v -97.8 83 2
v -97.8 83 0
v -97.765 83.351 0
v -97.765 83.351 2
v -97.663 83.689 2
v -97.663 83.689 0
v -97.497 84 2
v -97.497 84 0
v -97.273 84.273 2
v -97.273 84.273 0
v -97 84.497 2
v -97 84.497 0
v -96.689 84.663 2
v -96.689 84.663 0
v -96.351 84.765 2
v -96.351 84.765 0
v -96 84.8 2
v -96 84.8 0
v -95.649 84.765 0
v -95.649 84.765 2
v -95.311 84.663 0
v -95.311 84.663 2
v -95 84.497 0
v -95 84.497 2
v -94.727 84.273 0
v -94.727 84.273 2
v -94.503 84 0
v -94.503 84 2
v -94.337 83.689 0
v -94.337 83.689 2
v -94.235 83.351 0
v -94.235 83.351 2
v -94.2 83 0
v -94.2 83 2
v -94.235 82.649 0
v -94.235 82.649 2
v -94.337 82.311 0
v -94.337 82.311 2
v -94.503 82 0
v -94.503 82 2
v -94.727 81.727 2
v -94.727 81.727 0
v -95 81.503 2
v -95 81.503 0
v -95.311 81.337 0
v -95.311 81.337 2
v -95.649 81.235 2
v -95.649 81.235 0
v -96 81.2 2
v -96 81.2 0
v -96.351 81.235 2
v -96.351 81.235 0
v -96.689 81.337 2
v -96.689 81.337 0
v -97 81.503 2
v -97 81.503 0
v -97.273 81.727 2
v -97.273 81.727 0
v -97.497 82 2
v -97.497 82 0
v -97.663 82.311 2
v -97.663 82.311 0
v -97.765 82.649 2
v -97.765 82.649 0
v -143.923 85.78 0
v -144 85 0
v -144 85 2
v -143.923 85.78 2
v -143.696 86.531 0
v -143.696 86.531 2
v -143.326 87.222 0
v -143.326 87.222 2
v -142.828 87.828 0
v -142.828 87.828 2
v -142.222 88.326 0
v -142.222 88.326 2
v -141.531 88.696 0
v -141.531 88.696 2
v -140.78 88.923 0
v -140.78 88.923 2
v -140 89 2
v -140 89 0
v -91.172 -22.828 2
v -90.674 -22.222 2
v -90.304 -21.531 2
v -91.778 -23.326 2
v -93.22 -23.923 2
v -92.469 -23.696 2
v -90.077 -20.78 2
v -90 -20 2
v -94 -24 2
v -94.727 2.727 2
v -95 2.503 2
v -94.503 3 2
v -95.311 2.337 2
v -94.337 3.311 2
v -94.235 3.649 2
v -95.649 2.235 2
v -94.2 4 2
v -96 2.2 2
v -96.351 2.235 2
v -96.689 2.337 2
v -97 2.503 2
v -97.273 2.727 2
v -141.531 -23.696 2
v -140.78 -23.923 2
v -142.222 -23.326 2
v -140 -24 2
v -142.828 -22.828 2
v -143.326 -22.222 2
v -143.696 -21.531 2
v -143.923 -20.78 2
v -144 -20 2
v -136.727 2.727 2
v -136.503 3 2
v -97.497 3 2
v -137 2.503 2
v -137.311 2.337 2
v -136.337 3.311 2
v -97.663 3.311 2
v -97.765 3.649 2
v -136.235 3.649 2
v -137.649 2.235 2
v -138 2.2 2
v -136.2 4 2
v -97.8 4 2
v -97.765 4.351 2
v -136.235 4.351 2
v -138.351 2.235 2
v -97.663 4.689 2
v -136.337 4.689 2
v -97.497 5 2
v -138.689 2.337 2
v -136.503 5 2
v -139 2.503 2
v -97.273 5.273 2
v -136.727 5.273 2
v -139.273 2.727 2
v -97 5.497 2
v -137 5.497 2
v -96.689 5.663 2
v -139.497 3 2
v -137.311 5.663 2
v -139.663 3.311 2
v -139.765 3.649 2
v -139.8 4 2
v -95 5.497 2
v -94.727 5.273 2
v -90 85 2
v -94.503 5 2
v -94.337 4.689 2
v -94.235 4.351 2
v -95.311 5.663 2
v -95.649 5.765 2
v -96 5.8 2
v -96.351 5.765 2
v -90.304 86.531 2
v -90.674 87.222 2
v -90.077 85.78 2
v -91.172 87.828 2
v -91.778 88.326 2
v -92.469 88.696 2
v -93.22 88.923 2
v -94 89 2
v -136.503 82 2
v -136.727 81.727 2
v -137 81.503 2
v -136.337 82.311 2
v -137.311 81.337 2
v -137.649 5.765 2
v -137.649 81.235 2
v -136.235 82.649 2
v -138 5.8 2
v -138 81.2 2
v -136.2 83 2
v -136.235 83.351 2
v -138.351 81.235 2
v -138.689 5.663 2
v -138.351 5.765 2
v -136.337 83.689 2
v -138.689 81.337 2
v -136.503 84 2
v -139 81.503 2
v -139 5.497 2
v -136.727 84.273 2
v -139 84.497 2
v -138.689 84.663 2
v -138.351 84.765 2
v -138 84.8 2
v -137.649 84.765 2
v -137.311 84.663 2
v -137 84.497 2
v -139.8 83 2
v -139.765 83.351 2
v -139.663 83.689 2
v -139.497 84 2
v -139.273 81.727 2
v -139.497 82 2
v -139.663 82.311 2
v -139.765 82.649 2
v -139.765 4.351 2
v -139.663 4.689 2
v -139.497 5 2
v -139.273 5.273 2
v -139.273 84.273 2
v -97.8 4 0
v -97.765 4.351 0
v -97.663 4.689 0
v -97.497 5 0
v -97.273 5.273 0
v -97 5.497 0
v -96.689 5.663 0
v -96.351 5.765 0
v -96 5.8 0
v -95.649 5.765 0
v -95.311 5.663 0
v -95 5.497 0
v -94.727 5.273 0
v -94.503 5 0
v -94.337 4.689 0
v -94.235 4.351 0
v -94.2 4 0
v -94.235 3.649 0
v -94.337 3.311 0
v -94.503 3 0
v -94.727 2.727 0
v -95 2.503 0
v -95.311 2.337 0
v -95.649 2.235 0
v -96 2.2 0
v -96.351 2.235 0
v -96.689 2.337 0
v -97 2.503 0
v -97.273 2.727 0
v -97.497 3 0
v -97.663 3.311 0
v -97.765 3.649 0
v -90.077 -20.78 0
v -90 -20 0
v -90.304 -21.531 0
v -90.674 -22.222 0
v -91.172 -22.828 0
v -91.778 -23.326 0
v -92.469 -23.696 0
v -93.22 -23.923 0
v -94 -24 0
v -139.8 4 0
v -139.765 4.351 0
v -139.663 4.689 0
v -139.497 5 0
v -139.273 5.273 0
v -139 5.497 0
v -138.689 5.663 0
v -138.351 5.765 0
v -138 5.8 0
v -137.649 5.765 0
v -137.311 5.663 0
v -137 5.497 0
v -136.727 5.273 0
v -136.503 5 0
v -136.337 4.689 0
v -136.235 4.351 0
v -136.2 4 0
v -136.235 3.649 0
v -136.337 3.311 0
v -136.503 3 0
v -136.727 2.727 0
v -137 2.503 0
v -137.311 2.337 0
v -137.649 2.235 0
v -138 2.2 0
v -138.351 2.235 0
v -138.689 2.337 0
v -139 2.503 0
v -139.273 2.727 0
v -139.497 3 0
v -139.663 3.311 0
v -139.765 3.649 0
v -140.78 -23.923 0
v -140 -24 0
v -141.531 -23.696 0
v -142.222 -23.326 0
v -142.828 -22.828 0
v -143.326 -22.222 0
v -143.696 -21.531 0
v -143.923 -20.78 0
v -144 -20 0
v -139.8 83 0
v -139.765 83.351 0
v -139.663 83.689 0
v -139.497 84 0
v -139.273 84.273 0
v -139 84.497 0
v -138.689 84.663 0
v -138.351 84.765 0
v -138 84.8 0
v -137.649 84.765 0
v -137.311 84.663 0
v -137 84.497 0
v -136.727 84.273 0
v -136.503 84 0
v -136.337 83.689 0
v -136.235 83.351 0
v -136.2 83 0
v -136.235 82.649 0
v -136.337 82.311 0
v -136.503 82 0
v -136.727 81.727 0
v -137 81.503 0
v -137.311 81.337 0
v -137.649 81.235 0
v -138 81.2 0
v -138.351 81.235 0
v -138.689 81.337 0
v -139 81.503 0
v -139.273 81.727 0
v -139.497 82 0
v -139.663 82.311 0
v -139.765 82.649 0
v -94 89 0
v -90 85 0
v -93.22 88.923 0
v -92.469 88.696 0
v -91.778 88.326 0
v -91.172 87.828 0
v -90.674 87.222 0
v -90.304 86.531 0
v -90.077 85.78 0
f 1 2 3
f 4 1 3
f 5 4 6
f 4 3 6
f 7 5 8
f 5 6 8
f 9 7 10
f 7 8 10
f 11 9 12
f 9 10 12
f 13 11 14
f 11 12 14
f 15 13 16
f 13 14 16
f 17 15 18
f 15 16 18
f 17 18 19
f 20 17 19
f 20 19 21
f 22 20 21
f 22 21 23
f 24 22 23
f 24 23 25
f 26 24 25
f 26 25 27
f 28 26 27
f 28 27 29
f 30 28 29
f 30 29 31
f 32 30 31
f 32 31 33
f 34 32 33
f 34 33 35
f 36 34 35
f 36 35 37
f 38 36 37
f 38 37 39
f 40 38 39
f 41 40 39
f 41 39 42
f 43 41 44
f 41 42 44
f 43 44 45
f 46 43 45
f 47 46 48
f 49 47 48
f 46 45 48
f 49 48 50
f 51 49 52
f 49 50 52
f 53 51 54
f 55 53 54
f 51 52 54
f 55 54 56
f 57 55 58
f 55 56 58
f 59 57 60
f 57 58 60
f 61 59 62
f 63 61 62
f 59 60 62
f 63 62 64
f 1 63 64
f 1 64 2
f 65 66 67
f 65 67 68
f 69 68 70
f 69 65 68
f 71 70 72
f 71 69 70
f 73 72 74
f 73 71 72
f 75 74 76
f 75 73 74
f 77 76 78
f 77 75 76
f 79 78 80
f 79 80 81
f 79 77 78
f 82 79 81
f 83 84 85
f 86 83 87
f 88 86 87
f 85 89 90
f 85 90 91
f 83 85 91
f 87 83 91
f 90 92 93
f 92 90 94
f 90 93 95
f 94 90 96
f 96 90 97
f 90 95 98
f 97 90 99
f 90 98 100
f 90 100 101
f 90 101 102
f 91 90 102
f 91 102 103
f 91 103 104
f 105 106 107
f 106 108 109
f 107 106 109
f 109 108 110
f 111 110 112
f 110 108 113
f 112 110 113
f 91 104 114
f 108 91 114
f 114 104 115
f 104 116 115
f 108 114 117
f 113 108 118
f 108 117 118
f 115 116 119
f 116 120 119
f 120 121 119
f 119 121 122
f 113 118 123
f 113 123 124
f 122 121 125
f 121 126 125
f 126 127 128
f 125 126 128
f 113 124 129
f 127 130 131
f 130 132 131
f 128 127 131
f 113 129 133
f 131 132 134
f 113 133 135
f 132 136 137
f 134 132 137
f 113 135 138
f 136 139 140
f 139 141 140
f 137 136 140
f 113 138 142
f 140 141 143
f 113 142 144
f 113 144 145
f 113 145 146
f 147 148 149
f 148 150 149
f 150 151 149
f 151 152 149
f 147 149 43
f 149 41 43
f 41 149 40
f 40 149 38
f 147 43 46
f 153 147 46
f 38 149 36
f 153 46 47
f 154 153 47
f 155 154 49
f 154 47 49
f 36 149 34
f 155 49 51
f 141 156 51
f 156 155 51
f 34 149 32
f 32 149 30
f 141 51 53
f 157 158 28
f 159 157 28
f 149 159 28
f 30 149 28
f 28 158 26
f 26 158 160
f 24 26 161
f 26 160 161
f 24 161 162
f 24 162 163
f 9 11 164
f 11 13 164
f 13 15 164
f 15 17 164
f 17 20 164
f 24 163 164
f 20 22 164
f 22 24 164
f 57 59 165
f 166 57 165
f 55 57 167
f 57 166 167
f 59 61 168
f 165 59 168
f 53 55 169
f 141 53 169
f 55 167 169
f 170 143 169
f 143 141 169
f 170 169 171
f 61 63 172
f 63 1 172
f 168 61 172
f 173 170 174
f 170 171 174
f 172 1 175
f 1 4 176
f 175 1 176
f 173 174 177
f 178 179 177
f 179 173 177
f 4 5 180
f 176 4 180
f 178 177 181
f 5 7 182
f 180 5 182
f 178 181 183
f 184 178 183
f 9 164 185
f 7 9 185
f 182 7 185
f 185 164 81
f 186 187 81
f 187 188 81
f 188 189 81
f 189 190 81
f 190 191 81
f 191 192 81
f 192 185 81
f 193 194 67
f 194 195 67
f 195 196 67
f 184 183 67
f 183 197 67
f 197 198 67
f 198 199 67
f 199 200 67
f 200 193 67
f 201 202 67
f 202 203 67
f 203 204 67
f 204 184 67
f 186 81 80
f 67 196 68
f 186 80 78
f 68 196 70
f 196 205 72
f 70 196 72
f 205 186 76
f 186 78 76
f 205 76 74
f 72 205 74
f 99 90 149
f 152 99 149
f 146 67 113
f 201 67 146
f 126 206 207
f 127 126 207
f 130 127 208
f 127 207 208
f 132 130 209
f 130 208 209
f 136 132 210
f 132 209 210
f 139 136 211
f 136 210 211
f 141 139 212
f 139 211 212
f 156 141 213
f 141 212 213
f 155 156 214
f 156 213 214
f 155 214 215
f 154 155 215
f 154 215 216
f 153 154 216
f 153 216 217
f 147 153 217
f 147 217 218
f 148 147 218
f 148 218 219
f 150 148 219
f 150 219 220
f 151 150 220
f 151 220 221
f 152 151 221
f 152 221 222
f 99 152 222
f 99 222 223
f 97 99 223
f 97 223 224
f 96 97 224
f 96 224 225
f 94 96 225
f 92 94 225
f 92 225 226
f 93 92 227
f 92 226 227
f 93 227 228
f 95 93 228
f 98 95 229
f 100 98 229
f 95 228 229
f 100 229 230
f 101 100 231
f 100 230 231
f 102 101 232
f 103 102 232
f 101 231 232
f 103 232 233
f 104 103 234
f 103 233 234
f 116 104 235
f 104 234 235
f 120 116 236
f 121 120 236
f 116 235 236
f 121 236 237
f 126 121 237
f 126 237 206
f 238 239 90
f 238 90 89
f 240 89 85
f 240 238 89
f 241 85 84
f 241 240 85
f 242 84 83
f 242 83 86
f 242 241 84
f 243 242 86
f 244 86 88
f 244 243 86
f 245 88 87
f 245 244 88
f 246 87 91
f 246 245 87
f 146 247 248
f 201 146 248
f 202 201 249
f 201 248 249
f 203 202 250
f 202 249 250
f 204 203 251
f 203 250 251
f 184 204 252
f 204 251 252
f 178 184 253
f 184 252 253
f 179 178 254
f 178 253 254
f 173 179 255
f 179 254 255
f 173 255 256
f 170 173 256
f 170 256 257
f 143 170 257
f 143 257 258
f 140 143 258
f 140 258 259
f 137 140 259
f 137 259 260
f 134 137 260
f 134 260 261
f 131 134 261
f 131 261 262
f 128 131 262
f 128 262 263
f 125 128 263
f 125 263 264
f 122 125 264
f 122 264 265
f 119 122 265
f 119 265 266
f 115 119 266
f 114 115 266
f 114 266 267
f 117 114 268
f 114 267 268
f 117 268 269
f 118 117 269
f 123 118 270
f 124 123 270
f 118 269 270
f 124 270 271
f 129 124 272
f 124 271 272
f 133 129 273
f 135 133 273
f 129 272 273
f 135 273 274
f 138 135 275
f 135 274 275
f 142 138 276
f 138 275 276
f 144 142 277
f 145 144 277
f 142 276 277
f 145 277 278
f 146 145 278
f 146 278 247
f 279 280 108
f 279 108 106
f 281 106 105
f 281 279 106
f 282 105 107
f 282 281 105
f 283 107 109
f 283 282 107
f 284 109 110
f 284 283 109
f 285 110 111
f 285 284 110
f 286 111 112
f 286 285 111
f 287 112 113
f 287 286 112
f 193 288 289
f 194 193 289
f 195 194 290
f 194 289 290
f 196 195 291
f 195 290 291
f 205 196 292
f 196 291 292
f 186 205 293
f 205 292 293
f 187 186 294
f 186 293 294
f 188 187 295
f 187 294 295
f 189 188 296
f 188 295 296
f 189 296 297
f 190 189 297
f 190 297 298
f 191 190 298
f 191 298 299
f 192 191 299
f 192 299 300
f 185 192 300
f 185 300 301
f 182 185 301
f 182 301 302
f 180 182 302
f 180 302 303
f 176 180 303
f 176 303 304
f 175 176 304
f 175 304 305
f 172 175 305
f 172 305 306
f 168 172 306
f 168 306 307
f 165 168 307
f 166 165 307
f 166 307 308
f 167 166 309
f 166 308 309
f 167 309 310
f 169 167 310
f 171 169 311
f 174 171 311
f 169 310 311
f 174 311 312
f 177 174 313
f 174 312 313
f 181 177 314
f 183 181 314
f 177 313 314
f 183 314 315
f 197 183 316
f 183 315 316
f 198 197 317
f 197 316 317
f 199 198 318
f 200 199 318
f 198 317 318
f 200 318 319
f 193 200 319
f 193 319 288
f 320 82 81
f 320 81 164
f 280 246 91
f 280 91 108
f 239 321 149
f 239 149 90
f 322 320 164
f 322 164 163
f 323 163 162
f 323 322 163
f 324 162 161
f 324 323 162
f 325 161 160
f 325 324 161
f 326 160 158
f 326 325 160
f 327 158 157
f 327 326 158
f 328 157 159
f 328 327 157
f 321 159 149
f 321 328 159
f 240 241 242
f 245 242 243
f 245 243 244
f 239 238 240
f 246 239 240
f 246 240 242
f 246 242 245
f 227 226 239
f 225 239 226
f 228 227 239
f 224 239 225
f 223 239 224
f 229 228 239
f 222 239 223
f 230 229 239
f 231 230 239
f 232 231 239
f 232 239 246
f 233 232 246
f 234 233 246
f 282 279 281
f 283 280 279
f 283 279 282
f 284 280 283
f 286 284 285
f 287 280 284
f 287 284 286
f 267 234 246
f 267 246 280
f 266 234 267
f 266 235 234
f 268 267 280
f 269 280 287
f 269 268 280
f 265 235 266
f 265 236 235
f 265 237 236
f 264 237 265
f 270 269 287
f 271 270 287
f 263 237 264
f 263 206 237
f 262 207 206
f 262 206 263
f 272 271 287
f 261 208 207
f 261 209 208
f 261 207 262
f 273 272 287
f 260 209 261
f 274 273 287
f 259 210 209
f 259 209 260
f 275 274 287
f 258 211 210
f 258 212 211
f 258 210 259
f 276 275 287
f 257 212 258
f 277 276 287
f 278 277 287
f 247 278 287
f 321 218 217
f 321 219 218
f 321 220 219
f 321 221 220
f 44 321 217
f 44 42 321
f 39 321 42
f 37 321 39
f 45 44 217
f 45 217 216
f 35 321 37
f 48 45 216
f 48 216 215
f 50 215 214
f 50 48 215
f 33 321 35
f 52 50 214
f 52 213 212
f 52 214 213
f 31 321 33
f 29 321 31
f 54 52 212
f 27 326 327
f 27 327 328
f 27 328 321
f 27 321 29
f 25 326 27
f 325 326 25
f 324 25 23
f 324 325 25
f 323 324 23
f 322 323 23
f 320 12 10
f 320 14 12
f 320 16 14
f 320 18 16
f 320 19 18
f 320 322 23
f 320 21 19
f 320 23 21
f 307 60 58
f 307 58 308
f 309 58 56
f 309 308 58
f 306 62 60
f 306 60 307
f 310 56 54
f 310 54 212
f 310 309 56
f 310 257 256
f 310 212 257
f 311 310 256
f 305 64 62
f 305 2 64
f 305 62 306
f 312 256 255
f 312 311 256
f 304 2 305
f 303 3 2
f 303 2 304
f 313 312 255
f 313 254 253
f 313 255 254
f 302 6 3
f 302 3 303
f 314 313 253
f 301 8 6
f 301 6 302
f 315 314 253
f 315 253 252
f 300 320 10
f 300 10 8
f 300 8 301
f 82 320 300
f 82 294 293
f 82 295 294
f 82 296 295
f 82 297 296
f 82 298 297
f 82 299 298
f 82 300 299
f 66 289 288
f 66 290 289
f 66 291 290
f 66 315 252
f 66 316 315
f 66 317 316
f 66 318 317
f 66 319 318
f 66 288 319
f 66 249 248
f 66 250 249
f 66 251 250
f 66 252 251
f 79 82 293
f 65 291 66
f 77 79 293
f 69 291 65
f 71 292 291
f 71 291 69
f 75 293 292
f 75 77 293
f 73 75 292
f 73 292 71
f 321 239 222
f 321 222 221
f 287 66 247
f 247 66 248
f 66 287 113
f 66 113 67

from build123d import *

# Parameters (mm, degrees)
BOSS_EXTRUDE1_DEPTH     = 2
SKETCH2_R               = 1.8
CUT_EXTRUDE1_DEPTH      = 1
CUT_EXTRUDE1_DEPTH_BACK = 15.56824426


with BuildPart() as part:
    # Sketch1 → Boss-Extrude1 (new body)
    with BuildSketch(Plane.XY):
        with BuildLine():
            Line((-140.00000048, 89.00000126), (-93.99999888, 89.00000126))
            ThreePointArc((-93.99999888, 89.00000126), (-91.171571755, 87.828428385), (-89.99999888, 85.00000126))
            Line((-89.99999888, 85.00000126), (-89.99999888, -19.99999918))
            ThreePointArc((-89.99999888, -19.99999918), (-91.171571755, -22.828426305), (-93.99999888, -23.99999918))
            Line((-93.99999888, -23.99999918), (-140.00000048, -23.99999918))
            ThreePointArc((-140.00000048, -23.99999918), (-142.828427605, -22.828426305), (-144.00000048, -19.99999918))
            Line((-144.00000048, -19.99999918), (-144.00000048, 85.00000126))
            ThreePointArc((-144.00000048, 85.00000126), (-142.828427605, 87.828428385), (-140.00000048, 89.00000126))
        make_face()
    extrude(amount=BOSS_EXTRUDE1_DEPTH)

    # Sketch2 → Cut-Extrude1 (cut, two sides)
    with BuildSketch(Plane(origin=(0, 0, -12.56824426), x_dir=(-1, 0, 0), z_dir=(0, 0, -1))) as cut_extrude1_sk:
        with Locations((95.9999985, 82.99999962)):
            Circle(SKETCH2_R)
        with Locations((137.9999985, 82.99999962)):
            Circle(SKETCH2_R)
        with Locations((137.9999985, 3.99999962)):
            Circle(SKETCH2_R)
        with Locations((95.9999985, 3.99999962)):
            Circle(SKETCH2_R)
    extrude(amount=CUT_EXTRUDE1_DEPTH, mode=Mode.SUBTRACT)
    extrude(cut_extrude1_sk.sketch, amount=-CUT_EXTRUDE1_DEPTH_BACK, mode=Mode.SUBTRACT)


solid = part.part
